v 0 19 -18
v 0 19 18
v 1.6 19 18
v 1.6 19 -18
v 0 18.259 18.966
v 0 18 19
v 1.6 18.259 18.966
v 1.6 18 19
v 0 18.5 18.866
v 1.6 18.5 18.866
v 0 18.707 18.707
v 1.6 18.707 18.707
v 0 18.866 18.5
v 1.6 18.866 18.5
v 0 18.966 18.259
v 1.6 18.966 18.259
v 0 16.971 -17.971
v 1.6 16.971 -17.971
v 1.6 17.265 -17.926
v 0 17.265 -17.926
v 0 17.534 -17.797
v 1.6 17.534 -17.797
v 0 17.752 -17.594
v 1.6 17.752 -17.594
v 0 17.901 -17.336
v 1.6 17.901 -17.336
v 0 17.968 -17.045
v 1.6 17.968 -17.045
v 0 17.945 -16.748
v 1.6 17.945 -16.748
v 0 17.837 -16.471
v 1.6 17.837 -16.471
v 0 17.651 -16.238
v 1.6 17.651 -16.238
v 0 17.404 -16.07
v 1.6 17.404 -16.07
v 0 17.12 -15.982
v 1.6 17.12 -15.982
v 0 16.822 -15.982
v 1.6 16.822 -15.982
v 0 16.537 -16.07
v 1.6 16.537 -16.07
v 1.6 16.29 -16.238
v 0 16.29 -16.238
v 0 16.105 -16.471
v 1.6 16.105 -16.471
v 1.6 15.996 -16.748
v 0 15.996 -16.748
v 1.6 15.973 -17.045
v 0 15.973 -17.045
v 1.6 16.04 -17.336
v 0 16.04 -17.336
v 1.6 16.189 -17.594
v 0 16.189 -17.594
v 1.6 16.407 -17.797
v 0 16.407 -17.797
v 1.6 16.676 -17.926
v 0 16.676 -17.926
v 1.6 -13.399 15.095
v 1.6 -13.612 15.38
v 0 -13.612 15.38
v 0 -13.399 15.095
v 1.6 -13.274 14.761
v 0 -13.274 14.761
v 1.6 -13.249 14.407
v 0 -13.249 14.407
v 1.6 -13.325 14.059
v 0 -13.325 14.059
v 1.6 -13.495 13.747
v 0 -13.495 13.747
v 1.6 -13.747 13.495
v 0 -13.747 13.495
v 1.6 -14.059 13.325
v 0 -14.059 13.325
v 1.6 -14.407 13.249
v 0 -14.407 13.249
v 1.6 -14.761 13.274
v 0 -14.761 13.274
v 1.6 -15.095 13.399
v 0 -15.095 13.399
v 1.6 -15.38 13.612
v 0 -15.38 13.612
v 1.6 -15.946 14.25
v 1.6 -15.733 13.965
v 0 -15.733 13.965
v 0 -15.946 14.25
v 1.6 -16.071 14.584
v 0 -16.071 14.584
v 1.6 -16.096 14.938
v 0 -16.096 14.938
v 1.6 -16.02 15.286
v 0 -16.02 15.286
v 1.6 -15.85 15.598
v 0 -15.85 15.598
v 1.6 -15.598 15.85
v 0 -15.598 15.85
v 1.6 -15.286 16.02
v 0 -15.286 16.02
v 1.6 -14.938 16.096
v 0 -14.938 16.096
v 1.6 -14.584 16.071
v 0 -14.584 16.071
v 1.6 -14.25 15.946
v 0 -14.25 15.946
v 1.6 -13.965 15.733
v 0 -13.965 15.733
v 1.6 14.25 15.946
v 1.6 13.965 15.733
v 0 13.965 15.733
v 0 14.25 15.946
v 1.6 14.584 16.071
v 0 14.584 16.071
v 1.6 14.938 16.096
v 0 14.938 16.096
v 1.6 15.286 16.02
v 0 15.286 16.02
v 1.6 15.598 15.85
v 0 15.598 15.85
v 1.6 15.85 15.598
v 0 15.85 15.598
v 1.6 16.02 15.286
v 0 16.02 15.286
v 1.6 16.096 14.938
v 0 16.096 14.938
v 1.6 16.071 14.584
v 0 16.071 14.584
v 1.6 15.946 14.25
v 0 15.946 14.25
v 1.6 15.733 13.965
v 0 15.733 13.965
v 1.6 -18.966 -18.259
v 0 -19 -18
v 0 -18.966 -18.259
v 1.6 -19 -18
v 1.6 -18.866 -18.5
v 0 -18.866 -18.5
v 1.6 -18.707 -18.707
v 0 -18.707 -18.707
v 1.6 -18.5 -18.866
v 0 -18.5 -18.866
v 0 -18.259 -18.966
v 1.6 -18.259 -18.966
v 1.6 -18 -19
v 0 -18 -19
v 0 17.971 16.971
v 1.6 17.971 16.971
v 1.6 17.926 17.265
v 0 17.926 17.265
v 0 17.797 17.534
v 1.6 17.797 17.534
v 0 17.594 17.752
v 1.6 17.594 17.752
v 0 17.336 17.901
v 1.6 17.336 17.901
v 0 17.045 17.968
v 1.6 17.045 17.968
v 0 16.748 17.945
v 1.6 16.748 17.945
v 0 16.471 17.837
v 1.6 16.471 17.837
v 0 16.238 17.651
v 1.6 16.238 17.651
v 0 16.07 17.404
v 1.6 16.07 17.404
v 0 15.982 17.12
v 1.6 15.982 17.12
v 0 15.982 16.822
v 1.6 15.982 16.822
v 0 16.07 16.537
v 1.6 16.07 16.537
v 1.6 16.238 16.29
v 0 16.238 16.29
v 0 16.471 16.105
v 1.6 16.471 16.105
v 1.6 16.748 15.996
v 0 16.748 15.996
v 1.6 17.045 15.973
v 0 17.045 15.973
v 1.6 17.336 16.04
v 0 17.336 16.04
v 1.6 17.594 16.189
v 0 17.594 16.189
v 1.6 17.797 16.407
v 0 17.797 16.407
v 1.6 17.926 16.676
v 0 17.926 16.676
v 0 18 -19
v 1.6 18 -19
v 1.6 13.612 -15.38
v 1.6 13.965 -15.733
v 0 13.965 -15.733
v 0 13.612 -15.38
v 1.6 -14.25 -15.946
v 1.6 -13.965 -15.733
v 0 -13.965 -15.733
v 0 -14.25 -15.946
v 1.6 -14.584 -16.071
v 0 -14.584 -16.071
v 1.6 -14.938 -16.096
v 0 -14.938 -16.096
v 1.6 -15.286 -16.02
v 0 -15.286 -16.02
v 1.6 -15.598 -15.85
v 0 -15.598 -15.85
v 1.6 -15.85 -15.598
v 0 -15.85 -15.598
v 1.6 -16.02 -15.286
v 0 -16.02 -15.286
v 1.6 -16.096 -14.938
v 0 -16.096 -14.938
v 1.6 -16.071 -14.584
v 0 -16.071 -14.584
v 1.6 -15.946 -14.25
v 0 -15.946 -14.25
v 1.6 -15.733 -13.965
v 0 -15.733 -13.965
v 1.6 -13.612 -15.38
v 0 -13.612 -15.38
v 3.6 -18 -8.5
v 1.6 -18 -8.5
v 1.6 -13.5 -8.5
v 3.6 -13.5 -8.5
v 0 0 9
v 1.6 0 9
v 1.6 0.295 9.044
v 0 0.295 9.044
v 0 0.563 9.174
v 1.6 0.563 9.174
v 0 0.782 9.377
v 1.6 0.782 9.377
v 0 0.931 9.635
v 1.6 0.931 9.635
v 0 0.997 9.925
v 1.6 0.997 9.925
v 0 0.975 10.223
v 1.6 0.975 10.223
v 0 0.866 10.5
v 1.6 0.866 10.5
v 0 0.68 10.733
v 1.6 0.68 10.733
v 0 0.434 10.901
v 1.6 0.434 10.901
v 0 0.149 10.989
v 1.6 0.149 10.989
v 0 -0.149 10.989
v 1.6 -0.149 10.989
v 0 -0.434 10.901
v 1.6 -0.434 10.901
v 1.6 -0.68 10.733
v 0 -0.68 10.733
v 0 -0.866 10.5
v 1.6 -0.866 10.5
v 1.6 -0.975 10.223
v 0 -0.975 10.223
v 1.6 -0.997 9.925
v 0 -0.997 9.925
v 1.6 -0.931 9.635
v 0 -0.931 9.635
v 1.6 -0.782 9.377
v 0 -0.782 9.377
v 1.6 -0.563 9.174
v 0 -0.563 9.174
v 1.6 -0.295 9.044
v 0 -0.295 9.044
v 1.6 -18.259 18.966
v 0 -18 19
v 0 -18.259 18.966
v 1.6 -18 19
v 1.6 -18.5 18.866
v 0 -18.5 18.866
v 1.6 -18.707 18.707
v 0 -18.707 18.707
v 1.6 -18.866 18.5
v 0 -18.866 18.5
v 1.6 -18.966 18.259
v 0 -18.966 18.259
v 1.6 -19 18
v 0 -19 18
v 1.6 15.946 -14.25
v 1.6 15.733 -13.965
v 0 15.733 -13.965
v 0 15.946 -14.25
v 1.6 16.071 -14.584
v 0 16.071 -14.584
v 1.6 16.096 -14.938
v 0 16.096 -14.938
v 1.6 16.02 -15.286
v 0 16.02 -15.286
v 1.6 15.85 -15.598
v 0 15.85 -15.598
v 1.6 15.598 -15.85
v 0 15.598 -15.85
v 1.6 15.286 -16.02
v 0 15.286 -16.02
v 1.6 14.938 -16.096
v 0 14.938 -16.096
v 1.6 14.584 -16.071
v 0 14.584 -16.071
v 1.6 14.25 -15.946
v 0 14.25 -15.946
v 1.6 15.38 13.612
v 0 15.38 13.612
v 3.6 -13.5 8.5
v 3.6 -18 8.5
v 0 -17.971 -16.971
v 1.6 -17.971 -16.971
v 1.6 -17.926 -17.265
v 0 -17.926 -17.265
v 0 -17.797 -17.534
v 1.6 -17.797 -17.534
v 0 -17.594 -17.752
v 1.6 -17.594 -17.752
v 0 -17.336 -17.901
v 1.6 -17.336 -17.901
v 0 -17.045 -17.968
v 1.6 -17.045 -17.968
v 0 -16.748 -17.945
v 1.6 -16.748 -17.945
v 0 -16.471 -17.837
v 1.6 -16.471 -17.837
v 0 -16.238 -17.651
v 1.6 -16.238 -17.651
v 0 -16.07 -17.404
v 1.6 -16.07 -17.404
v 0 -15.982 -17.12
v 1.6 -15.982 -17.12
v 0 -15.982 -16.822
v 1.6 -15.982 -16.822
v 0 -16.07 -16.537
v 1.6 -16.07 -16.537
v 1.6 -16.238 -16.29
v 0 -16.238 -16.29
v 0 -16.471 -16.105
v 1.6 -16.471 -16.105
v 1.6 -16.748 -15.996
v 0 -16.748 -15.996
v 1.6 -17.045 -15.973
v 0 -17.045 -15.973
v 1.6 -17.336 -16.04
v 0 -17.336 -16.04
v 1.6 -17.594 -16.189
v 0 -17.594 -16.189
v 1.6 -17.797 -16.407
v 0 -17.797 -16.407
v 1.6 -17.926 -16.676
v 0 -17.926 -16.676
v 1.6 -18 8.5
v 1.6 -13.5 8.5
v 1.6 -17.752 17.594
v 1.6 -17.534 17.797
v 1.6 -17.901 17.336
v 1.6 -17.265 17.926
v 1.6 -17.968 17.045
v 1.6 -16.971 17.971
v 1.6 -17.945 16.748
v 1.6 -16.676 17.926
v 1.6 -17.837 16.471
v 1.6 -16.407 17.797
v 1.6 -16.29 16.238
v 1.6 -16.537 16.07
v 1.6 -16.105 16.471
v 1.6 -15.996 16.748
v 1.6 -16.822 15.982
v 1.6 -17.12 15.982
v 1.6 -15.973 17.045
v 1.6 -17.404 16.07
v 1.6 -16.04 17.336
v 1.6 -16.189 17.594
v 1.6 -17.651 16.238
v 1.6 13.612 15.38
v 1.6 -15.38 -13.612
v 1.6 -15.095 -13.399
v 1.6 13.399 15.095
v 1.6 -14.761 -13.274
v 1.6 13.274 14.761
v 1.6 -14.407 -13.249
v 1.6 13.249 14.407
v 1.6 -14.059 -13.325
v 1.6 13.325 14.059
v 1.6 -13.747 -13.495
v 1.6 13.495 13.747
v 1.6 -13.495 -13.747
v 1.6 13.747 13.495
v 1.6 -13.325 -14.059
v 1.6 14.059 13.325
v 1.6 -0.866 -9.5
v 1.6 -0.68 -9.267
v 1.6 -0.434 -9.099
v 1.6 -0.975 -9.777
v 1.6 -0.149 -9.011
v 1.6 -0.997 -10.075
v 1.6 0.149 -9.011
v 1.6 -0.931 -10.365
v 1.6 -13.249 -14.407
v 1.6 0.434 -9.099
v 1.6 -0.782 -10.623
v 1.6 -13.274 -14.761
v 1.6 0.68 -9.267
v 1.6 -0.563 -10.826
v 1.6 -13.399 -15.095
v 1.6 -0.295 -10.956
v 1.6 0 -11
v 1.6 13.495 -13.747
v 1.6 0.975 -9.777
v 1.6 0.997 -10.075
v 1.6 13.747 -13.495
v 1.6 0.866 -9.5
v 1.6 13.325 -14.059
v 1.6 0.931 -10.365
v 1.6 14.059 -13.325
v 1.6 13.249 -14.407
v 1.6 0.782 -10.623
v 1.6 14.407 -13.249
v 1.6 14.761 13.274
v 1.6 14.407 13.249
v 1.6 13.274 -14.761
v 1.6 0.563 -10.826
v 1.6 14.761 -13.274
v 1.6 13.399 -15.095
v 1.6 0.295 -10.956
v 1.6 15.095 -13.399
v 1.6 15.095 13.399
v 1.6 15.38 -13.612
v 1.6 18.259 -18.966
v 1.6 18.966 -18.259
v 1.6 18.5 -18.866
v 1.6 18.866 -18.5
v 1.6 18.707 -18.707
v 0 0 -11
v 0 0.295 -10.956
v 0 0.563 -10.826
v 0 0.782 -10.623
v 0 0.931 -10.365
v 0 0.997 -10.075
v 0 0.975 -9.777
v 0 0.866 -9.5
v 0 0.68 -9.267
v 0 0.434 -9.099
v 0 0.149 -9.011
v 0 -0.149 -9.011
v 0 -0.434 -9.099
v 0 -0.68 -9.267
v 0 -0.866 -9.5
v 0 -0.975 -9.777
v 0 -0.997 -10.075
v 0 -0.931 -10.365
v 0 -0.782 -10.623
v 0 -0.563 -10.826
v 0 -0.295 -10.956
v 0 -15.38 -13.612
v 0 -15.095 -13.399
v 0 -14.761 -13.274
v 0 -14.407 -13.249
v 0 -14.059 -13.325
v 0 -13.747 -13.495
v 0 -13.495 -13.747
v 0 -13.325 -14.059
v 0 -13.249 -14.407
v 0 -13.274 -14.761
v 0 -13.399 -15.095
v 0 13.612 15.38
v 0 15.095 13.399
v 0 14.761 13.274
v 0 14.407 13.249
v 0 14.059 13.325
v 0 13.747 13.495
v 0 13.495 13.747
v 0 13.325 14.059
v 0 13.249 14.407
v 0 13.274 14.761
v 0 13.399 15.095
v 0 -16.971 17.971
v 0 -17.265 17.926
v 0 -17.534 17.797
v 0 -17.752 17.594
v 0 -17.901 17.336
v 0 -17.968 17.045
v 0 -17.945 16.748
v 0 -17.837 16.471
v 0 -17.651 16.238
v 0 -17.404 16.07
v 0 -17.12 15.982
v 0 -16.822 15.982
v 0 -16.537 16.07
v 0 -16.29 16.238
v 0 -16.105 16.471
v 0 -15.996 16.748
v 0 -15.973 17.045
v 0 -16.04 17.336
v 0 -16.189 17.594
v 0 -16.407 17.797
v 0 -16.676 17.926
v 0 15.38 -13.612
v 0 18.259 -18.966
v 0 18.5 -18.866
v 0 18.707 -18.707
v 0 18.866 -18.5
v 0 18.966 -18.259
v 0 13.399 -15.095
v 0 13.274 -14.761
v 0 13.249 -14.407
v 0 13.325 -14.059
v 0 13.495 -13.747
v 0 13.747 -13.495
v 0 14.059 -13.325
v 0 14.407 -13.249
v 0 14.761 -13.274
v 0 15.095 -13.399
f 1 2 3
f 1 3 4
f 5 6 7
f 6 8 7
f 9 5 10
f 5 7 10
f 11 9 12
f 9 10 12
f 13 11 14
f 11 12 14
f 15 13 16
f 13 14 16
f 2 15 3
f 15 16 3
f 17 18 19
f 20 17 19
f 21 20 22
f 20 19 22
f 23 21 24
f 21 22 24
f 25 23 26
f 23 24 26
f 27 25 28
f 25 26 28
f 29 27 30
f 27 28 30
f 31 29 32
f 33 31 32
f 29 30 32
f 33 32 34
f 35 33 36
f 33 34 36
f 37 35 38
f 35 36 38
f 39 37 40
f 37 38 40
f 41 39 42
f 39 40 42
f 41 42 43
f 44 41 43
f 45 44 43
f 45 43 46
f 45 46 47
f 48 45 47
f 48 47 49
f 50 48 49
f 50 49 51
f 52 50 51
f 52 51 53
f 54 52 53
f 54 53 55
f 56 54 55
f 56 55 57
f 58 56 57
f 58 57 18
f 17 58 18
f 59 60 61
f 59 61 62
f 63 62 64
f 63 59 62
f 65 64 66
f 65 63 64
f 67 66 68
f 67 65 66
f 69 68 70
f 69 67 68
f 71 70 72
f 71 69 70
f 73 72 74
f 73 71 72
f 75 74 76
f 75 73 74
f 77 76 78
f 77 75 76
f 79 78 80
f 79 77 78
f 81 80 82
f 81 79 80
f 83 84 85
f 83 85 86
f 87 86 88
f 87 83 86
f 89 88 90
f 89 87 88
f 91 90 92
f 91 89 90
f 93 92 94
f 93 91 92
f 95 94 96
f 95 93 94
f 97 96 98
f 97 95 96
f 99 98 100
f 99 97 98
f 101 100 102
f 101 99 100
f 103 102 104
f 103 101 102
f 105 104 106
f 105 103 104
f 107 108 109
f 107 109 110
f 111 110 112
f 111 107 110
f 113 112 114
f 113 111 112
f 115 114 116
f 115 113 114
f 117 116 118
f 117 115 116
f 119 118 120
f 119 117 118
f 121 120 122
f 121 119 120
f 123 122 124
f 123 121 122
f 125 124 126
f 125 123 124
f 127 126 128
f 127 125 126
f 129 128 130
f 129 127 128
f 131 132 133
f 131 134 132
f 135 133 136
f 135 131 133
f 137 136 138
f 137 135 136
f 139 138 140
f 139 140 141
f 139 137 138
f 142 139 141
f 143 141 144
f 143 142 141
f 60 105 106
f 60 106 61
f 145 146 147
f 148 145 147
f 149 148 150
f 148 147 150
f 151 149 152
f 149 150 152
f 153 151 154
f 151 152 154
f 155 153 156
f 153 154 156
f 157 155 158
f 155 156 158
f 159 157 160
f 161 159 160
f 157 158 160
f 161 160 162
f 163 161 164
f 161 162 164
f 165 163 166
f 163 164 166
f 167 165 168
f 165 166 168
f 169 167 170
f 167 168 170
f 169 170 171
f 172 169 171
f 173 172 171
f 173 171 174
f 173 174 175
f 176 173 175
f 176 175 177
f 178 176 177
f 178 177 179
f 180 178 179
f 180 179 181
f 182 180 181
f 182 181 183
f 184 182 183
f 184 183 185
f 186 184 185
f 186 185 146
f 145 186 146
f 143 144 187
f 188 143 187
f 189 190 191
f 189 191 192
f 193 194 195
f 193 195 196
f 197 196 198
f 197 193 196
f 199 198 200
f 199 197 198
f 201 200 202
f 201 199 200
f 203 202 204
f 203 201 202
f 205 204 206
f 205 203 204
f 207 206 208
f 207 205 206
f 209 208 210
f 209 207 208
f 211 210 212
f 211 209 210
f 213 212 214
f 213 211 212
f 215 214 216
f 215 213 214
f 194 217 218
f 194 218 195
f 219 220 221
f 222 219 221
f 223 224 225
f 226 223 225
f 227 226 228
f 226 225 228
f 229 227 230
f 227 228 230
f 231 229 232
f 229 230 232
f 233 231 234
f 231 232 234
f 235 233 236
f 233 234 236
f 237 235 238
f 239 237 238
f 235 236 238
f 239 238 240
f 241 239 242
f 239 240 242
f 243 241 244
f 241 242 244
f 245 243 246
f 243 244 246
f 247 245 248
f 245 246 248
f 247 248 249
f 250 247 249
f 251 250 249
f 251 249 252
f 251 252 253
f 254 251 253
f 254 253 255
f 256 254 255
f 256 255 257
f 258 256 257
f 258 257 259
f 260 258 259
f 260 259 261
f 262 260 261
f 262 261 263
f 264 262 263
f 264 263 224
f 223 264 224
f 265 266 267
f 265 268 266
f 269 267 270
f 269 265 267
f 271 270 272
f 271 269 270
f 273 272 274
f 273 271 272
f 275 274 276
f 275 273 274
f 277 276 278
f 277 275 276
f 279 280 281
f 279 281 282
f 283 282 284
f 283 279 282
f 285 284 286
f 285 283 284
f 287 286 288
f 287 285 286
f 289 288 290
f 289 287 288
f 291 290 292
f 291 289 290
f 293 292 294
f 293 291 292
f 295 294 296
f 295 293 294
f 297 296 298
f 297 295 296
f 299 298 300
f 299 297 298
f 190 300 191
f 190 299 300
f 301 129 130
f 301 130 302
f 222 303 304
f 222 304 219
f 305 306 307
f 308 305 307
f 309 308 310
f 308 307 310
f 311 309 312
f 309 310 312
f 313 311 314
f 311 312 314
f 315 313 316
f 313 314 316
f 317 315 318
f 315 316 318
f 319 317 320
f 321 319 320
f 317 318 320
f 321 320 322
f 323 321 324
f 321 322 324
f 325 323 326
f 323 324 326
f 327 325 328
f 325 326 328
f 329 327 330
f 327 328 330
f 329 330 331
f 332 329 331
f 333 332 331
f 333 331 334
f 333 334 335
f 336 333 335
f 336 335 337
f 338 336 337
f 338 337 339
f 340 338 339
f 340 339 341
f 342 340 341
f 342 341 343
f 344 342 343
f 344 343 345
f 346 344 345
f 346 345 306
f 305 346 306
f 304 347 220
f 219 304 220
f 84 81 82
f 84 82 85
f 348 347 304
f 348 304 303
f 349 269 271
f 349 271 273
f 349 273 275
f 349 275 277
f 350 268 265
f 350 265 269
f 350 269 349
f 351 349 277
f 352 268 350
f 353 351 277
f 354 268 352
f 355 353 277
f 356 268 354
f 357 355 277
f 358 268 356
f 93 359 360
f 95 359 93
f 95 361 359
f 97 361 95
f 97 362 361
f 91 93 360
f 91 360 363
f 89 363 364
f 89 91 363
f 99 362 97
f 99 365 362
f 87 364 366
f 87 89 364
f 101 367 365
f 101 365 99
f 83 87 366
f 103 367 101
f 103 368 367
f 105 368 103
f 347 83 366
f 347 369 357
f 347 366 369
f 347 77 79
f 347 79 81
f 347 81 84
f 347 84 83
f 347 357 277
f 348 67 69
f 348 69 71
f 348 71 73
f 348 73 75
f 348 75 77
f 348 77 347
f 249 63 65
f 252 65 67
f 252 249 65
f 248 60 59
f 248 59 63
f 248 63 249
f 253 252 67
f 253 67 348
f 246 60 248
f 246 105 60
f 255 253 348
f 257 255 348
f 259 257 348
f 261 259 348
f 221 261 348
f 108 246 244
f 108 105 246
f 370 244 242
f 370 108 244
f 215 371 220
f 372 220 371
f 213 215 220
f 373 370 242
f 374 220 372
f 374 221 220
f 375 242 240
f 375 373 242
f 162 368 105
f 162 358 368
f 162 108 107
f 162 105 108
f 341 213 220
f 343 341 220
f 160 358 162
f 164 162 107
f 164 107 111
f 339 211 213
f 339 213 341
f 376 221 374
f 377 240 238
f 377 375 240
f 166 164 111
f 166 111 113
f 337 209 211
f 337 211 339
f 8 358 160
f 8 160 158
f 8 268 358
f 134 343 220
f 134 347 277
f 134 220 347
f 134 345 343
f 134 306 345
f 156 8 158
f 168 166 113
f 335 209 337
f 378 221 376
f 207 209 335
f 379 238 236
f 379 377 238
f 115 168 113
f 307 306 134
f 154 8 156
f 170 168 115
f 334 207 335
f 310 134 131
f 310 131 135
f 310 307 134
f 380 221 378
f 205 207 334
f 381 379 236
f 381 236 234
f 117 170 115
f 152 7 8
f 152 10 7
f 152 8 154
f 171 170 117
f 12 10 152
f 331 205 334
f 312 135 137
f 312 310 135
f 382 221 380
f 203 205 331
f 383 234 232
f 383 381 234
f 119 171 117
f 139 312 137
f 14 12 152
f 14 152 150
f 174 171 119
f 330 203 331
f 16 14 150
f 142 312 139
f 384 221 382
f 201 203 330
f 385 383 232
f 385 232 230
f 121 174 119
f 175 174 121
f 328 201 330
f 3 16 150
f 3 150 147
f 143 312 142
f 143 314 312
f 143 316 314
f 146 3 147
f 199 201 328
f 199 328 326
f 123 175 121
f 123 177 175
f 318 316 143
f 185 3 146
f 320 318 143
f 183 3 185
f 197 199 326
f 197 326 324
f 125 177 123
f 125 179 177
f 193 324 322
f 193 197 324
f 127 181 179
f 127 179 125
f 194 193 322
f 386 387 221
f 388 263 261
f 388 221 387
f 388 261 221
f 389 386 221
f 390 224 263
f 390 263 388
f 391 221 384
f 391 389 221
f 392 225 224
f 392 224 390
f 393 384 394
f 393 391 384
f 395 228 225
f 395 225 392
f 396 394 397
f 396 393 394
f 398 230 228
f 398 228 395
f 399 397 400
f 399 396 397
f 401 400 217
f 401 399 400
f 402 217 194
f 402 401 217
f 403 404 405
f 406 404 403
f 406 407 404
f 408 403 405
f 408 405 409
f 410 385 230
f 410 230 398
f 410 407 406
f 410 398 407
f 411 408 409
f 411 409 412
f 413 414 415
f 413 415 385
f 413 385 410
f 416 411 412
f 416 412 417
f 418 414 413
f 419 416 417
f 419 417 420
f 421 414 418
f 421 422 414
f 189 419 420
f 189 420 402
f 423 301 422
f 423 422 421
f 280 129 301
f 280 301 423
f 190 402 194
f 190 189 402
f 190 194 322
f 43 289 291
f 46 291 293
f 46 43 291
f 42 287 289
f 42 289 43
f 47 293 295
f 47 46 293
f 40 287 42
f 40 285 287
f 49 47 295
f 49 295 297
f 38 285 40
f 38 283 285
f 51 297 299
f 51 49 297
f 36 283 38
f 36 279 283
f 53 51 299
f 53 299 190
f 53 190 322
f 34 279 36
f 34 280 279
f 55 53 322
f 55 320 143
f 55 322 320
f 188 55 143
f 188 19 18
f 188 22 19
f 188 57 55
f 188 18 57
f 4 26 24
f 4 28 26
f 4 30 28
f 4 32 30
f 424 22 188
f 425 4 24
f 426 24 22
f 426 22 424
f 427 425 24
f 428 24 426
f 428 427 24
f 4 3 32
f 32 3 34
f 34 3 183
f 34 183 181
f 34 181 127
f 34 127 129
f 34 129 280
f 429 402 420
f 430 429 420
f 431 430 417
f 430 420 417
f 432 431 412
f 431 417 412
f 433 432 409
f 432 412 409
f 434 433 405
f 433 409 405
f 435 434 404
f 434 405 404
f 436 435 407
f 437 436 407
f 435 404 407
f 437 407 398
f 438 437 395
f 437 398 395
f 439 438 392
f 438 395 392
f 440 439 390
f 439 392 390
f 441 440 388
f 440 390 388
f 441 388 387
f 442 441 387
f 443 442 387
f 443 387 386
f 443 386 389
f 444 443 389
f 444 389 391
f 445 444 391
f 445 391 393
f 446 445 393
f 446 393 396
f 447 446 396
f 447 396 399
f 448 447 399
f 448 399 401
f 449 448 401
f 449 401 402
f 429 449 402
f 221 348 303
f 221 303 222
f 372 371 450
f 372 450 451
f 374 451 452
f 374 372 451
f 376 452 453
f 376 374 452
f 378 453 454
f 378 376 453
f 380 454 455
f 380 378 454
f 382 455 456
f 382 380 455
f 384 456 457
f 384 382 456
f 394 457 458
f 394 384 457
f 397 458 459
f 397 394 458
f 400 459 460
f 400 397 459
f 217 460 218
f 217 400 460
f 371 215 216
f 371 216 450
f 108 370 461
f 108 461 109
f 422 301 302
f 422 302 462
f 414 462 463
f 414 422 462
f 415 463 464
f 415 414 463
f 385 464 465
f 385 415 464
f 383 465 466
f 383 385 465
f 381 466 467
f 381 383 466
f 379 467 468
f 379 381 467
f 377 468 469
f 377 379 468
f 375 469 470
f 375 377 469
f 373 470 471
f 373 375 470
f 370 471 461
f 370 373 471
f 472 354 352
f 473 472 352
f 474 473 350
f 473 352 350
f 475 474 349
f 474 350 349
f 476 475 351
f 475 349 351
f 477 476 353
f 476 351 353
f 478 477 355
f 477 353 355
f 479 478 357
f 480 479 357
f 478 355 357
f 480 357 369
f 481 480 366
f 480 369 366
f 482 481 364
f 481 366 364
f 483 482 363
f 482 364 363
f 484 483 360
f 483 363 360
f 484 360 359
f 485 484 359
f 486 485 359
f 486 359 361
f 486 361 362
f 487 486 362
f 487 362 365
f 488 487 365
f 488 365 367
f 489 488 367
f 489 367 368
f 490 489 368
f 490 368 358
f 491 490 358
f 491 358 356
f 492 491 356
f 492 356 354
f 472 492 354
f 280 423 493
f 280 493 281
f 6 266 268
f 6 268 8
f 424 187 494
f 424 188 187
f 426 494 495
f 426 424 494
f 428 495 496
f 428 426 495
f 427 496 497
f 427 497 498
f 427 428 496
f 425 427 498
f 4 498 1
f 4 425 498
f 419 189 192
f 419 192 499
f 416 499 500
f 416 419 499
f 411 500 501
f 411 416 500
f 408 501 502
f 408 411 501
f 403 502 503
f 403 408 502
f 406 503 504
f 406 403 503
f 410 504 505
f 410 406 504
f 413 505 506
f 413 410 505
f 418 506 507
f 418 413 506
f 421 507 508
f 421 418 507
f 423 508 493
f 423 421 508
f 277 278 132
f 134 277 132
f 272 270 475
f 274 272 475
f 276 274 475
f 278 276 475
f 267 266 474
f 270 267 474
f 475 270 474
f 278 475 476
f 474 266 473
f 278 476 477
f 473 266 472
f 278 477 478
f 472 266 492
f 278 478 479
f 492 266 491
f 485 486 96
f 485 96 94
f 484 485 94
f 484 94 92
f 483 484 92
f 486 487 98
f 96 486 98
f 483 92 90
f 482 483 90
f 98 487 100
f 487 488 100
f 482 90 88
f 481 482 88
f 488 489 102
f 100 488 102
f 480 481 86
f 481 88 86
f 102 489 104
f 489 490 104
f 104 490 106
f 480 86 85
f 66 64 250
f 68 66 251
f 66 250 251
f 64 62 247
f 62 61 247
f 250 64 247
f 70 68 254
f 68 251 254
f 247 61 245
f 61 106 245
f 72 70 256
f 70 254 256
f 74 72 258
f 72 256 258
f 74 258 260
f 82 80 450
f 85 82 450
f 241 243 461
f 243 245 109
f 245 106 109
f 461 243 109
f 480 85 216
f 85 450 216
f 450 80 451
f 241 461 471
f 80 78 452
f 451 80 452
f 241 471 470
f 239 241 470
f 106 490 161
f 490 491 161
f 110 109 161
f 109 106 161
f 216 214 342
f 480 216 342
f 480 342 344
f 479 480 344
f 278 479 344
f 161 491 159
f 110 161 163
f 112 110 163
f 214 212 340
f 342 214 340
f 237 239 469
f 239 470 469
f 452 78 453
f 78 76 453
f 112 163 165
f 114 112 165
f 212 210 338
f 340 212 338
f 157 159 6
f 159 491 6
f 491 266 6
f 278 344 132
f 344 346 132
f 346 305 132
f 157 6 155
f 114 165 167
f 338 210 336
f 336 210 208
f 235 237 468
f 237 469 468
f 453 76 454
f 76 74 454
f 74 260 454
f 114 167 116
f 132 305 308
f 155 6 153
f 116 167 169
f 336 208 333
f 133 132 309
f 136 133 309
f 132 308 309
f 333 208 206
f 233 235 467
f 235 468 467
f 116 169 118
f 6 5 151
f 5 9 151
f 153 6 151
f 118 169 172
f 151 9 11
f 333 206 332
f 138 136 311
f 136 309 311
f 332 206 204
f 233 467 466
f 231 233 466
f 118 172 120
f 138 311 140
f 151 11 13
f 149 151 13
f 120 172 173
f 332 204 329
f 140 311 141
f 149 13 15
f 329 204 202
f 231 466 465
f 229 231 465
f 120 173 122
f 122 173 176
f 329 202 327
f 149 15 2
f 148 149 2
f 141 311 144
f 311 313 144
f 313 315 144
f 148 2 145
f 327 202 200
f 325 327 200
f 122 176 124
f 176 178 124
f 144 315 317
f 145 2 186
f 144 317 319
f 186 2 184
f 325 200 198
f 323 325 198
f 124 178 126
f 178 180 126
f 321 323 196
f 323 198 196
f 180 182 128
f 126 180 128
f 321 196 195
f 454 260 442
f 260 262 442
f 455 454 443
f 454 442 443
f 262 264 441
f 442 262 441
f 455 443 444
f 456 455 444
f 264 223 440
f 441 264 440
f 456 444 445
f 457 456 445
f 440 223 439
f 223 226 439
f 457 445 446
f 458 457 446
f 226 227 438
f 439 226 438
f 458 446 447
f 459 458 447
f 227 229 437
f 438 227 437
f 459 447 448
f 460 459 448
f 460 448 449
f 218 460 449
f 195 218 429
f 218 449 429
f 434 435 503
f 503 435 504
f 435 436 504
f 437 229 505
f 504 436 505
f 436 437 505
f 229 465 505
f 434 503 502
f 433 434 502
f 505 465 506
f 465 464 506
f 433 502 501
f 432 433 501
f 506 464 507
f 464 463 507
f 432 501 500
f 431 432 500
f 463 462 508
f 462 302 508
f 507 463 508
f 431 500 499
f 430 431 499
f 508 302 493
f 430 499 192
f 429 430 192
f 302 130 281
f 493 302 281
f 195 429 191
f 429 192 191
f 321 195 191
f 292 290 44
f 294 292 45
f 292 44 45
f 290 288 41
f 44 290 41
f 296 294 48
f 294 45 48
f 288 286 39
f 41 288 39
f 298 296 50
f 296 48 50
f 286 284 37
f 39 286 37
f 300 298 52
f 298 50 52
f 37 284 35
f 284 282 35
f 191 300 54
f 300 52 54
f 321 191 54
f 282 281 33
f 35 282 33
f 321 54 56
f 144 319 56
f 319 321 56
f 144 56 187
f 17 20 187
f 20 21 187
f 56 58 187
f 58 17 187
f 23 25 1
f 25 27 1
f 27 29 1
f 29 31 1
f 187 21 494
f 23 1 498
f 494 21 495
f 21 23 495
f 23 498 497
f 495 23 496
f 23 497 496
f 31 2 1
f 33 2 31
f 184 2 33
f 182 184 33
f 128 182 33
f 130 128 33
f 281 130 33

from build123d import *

# Parameters (mm, degrees)
ESQUISSE1_W                  = 38
ESQUISSE1_H                  = 38
BOSS_EXTRU_1_DEPTH           = 1.6
CONG_1_R                     = 1
ESQUISSE2_R                  = 1
ENL_V_MAT_EXTRU_1_DEPTH      = 27.917652201
ESQUISSE3_R                  = 1
ENL_V_MAT_EXTRU_2_DEPTH      = 27.917652201
R_P_TITION_CIRCULAIRE1_COUNT = 4
ESQUISSE4_W                  = 17
ESQUISSE4_H                  = 4.5
BOSS_EXTRU_2_DEPTH           = 2


with BuildPart() as part:
    # Esquisse1 → Boss.-Extru.1 (new body)
    with BuildSketch(Plane(origin=(0, 0, 0), x_dir=(0, 0, -1), z_dir=(1, 0, 0))):
        Rectangle(ESQUISSE1_W, ESQUISSE1_H)
    extrude(amount=BOSS_EXTRU_1_DEPTH)

    # Congé1
    cong_1_edges = [part.edges().sort_by_distance(p)[0] for p in [
        (0.8, -19, 19),
        (0.8, -19, -19),
        (0.8, 19, -19),
        (0.8, 19, 19),
    ]]
    fillet(cong_1_edges, radius=CONG_1_R)

    # Esquisse2 → Enlèv. mat.-Extru.1 (cut, through all)
    with BuildSketch(Plane(origin=(1.6, 0, 0), x_dir=(0, 0, -1), z_dir=(1, 0, 0))):
        with Locations((-10, 0)):
            Circle(ESQUISSE2_R)
        with Locations((10, 0)):
            Circle(ESQUISSE2_R)
    extrude(amount=-ENL_V_MAT_EXTRU_1_DEPTH, mode=Mode.SUBTRACT)

    # Esquisse3 → Enlèv. mat.-Extru.2 (cut, through all)
    with BuildSketch(Plane(origin=(1.6, 0, 0), x_dir=(0, 0, -1), z_dir=(1, 0, 0))):
        with Locations((16.970562748, 16.970562748)):
            Circle(ESQUISSE3_R)
        with BuildLine():
            Line((13.611805538, 15.379572491), (13.965358928, 15.733125881))
            ThreePointArc((13.965358928, 15.733125881), (15.733125881, 15.733125881), (15.733125881, 13.965358928))
            Line((15.733125881, 13.965358928), (15.379572491, 13.611805538))
            ThreePointArc((15.379572491, 13.611805538), (13.611805538, 13.611805538), (13.611805538, 15.379572491))
        make_face()
    enl_v_mat_extru_2 = extrude(amount=-ENL_V_MAT_EXTRU_2_DEPTH, mode=Mode.SUBTRACT)

    # Répétition circulaire1: Enlèv. mat.-Extru.2 ×4 about axis
    r_p_tition_circulaire1_axis = Axis((9.401737049, 0, 0), (-1, 0, 0))
    for i in range(1, R_P_TITION_CIRCULAIRE1_COUNT):
        add(enl_v_mat_extru_2.rotate(r_p_tition_circulaire1_axis, i * 360 / R_P_TITION_CIRCULAIRE1_COUNT), mode=Mode.SUBTRACT)

    # Esquisse4 → Boss.-Extru.2 (add)
    with BuildSketch(Plane(origin=(1.6, 0, 0), x_dir=(0, 0, -1), z_dir=(1, 0, 0))):
        with Locations((0, -15.75)):
            Rectangle(ESQUISSE4_W, ESQUISSE4_H)
    extrude(amount=BOSS_EXTRU_2_DEPTH)


solid = part.part
